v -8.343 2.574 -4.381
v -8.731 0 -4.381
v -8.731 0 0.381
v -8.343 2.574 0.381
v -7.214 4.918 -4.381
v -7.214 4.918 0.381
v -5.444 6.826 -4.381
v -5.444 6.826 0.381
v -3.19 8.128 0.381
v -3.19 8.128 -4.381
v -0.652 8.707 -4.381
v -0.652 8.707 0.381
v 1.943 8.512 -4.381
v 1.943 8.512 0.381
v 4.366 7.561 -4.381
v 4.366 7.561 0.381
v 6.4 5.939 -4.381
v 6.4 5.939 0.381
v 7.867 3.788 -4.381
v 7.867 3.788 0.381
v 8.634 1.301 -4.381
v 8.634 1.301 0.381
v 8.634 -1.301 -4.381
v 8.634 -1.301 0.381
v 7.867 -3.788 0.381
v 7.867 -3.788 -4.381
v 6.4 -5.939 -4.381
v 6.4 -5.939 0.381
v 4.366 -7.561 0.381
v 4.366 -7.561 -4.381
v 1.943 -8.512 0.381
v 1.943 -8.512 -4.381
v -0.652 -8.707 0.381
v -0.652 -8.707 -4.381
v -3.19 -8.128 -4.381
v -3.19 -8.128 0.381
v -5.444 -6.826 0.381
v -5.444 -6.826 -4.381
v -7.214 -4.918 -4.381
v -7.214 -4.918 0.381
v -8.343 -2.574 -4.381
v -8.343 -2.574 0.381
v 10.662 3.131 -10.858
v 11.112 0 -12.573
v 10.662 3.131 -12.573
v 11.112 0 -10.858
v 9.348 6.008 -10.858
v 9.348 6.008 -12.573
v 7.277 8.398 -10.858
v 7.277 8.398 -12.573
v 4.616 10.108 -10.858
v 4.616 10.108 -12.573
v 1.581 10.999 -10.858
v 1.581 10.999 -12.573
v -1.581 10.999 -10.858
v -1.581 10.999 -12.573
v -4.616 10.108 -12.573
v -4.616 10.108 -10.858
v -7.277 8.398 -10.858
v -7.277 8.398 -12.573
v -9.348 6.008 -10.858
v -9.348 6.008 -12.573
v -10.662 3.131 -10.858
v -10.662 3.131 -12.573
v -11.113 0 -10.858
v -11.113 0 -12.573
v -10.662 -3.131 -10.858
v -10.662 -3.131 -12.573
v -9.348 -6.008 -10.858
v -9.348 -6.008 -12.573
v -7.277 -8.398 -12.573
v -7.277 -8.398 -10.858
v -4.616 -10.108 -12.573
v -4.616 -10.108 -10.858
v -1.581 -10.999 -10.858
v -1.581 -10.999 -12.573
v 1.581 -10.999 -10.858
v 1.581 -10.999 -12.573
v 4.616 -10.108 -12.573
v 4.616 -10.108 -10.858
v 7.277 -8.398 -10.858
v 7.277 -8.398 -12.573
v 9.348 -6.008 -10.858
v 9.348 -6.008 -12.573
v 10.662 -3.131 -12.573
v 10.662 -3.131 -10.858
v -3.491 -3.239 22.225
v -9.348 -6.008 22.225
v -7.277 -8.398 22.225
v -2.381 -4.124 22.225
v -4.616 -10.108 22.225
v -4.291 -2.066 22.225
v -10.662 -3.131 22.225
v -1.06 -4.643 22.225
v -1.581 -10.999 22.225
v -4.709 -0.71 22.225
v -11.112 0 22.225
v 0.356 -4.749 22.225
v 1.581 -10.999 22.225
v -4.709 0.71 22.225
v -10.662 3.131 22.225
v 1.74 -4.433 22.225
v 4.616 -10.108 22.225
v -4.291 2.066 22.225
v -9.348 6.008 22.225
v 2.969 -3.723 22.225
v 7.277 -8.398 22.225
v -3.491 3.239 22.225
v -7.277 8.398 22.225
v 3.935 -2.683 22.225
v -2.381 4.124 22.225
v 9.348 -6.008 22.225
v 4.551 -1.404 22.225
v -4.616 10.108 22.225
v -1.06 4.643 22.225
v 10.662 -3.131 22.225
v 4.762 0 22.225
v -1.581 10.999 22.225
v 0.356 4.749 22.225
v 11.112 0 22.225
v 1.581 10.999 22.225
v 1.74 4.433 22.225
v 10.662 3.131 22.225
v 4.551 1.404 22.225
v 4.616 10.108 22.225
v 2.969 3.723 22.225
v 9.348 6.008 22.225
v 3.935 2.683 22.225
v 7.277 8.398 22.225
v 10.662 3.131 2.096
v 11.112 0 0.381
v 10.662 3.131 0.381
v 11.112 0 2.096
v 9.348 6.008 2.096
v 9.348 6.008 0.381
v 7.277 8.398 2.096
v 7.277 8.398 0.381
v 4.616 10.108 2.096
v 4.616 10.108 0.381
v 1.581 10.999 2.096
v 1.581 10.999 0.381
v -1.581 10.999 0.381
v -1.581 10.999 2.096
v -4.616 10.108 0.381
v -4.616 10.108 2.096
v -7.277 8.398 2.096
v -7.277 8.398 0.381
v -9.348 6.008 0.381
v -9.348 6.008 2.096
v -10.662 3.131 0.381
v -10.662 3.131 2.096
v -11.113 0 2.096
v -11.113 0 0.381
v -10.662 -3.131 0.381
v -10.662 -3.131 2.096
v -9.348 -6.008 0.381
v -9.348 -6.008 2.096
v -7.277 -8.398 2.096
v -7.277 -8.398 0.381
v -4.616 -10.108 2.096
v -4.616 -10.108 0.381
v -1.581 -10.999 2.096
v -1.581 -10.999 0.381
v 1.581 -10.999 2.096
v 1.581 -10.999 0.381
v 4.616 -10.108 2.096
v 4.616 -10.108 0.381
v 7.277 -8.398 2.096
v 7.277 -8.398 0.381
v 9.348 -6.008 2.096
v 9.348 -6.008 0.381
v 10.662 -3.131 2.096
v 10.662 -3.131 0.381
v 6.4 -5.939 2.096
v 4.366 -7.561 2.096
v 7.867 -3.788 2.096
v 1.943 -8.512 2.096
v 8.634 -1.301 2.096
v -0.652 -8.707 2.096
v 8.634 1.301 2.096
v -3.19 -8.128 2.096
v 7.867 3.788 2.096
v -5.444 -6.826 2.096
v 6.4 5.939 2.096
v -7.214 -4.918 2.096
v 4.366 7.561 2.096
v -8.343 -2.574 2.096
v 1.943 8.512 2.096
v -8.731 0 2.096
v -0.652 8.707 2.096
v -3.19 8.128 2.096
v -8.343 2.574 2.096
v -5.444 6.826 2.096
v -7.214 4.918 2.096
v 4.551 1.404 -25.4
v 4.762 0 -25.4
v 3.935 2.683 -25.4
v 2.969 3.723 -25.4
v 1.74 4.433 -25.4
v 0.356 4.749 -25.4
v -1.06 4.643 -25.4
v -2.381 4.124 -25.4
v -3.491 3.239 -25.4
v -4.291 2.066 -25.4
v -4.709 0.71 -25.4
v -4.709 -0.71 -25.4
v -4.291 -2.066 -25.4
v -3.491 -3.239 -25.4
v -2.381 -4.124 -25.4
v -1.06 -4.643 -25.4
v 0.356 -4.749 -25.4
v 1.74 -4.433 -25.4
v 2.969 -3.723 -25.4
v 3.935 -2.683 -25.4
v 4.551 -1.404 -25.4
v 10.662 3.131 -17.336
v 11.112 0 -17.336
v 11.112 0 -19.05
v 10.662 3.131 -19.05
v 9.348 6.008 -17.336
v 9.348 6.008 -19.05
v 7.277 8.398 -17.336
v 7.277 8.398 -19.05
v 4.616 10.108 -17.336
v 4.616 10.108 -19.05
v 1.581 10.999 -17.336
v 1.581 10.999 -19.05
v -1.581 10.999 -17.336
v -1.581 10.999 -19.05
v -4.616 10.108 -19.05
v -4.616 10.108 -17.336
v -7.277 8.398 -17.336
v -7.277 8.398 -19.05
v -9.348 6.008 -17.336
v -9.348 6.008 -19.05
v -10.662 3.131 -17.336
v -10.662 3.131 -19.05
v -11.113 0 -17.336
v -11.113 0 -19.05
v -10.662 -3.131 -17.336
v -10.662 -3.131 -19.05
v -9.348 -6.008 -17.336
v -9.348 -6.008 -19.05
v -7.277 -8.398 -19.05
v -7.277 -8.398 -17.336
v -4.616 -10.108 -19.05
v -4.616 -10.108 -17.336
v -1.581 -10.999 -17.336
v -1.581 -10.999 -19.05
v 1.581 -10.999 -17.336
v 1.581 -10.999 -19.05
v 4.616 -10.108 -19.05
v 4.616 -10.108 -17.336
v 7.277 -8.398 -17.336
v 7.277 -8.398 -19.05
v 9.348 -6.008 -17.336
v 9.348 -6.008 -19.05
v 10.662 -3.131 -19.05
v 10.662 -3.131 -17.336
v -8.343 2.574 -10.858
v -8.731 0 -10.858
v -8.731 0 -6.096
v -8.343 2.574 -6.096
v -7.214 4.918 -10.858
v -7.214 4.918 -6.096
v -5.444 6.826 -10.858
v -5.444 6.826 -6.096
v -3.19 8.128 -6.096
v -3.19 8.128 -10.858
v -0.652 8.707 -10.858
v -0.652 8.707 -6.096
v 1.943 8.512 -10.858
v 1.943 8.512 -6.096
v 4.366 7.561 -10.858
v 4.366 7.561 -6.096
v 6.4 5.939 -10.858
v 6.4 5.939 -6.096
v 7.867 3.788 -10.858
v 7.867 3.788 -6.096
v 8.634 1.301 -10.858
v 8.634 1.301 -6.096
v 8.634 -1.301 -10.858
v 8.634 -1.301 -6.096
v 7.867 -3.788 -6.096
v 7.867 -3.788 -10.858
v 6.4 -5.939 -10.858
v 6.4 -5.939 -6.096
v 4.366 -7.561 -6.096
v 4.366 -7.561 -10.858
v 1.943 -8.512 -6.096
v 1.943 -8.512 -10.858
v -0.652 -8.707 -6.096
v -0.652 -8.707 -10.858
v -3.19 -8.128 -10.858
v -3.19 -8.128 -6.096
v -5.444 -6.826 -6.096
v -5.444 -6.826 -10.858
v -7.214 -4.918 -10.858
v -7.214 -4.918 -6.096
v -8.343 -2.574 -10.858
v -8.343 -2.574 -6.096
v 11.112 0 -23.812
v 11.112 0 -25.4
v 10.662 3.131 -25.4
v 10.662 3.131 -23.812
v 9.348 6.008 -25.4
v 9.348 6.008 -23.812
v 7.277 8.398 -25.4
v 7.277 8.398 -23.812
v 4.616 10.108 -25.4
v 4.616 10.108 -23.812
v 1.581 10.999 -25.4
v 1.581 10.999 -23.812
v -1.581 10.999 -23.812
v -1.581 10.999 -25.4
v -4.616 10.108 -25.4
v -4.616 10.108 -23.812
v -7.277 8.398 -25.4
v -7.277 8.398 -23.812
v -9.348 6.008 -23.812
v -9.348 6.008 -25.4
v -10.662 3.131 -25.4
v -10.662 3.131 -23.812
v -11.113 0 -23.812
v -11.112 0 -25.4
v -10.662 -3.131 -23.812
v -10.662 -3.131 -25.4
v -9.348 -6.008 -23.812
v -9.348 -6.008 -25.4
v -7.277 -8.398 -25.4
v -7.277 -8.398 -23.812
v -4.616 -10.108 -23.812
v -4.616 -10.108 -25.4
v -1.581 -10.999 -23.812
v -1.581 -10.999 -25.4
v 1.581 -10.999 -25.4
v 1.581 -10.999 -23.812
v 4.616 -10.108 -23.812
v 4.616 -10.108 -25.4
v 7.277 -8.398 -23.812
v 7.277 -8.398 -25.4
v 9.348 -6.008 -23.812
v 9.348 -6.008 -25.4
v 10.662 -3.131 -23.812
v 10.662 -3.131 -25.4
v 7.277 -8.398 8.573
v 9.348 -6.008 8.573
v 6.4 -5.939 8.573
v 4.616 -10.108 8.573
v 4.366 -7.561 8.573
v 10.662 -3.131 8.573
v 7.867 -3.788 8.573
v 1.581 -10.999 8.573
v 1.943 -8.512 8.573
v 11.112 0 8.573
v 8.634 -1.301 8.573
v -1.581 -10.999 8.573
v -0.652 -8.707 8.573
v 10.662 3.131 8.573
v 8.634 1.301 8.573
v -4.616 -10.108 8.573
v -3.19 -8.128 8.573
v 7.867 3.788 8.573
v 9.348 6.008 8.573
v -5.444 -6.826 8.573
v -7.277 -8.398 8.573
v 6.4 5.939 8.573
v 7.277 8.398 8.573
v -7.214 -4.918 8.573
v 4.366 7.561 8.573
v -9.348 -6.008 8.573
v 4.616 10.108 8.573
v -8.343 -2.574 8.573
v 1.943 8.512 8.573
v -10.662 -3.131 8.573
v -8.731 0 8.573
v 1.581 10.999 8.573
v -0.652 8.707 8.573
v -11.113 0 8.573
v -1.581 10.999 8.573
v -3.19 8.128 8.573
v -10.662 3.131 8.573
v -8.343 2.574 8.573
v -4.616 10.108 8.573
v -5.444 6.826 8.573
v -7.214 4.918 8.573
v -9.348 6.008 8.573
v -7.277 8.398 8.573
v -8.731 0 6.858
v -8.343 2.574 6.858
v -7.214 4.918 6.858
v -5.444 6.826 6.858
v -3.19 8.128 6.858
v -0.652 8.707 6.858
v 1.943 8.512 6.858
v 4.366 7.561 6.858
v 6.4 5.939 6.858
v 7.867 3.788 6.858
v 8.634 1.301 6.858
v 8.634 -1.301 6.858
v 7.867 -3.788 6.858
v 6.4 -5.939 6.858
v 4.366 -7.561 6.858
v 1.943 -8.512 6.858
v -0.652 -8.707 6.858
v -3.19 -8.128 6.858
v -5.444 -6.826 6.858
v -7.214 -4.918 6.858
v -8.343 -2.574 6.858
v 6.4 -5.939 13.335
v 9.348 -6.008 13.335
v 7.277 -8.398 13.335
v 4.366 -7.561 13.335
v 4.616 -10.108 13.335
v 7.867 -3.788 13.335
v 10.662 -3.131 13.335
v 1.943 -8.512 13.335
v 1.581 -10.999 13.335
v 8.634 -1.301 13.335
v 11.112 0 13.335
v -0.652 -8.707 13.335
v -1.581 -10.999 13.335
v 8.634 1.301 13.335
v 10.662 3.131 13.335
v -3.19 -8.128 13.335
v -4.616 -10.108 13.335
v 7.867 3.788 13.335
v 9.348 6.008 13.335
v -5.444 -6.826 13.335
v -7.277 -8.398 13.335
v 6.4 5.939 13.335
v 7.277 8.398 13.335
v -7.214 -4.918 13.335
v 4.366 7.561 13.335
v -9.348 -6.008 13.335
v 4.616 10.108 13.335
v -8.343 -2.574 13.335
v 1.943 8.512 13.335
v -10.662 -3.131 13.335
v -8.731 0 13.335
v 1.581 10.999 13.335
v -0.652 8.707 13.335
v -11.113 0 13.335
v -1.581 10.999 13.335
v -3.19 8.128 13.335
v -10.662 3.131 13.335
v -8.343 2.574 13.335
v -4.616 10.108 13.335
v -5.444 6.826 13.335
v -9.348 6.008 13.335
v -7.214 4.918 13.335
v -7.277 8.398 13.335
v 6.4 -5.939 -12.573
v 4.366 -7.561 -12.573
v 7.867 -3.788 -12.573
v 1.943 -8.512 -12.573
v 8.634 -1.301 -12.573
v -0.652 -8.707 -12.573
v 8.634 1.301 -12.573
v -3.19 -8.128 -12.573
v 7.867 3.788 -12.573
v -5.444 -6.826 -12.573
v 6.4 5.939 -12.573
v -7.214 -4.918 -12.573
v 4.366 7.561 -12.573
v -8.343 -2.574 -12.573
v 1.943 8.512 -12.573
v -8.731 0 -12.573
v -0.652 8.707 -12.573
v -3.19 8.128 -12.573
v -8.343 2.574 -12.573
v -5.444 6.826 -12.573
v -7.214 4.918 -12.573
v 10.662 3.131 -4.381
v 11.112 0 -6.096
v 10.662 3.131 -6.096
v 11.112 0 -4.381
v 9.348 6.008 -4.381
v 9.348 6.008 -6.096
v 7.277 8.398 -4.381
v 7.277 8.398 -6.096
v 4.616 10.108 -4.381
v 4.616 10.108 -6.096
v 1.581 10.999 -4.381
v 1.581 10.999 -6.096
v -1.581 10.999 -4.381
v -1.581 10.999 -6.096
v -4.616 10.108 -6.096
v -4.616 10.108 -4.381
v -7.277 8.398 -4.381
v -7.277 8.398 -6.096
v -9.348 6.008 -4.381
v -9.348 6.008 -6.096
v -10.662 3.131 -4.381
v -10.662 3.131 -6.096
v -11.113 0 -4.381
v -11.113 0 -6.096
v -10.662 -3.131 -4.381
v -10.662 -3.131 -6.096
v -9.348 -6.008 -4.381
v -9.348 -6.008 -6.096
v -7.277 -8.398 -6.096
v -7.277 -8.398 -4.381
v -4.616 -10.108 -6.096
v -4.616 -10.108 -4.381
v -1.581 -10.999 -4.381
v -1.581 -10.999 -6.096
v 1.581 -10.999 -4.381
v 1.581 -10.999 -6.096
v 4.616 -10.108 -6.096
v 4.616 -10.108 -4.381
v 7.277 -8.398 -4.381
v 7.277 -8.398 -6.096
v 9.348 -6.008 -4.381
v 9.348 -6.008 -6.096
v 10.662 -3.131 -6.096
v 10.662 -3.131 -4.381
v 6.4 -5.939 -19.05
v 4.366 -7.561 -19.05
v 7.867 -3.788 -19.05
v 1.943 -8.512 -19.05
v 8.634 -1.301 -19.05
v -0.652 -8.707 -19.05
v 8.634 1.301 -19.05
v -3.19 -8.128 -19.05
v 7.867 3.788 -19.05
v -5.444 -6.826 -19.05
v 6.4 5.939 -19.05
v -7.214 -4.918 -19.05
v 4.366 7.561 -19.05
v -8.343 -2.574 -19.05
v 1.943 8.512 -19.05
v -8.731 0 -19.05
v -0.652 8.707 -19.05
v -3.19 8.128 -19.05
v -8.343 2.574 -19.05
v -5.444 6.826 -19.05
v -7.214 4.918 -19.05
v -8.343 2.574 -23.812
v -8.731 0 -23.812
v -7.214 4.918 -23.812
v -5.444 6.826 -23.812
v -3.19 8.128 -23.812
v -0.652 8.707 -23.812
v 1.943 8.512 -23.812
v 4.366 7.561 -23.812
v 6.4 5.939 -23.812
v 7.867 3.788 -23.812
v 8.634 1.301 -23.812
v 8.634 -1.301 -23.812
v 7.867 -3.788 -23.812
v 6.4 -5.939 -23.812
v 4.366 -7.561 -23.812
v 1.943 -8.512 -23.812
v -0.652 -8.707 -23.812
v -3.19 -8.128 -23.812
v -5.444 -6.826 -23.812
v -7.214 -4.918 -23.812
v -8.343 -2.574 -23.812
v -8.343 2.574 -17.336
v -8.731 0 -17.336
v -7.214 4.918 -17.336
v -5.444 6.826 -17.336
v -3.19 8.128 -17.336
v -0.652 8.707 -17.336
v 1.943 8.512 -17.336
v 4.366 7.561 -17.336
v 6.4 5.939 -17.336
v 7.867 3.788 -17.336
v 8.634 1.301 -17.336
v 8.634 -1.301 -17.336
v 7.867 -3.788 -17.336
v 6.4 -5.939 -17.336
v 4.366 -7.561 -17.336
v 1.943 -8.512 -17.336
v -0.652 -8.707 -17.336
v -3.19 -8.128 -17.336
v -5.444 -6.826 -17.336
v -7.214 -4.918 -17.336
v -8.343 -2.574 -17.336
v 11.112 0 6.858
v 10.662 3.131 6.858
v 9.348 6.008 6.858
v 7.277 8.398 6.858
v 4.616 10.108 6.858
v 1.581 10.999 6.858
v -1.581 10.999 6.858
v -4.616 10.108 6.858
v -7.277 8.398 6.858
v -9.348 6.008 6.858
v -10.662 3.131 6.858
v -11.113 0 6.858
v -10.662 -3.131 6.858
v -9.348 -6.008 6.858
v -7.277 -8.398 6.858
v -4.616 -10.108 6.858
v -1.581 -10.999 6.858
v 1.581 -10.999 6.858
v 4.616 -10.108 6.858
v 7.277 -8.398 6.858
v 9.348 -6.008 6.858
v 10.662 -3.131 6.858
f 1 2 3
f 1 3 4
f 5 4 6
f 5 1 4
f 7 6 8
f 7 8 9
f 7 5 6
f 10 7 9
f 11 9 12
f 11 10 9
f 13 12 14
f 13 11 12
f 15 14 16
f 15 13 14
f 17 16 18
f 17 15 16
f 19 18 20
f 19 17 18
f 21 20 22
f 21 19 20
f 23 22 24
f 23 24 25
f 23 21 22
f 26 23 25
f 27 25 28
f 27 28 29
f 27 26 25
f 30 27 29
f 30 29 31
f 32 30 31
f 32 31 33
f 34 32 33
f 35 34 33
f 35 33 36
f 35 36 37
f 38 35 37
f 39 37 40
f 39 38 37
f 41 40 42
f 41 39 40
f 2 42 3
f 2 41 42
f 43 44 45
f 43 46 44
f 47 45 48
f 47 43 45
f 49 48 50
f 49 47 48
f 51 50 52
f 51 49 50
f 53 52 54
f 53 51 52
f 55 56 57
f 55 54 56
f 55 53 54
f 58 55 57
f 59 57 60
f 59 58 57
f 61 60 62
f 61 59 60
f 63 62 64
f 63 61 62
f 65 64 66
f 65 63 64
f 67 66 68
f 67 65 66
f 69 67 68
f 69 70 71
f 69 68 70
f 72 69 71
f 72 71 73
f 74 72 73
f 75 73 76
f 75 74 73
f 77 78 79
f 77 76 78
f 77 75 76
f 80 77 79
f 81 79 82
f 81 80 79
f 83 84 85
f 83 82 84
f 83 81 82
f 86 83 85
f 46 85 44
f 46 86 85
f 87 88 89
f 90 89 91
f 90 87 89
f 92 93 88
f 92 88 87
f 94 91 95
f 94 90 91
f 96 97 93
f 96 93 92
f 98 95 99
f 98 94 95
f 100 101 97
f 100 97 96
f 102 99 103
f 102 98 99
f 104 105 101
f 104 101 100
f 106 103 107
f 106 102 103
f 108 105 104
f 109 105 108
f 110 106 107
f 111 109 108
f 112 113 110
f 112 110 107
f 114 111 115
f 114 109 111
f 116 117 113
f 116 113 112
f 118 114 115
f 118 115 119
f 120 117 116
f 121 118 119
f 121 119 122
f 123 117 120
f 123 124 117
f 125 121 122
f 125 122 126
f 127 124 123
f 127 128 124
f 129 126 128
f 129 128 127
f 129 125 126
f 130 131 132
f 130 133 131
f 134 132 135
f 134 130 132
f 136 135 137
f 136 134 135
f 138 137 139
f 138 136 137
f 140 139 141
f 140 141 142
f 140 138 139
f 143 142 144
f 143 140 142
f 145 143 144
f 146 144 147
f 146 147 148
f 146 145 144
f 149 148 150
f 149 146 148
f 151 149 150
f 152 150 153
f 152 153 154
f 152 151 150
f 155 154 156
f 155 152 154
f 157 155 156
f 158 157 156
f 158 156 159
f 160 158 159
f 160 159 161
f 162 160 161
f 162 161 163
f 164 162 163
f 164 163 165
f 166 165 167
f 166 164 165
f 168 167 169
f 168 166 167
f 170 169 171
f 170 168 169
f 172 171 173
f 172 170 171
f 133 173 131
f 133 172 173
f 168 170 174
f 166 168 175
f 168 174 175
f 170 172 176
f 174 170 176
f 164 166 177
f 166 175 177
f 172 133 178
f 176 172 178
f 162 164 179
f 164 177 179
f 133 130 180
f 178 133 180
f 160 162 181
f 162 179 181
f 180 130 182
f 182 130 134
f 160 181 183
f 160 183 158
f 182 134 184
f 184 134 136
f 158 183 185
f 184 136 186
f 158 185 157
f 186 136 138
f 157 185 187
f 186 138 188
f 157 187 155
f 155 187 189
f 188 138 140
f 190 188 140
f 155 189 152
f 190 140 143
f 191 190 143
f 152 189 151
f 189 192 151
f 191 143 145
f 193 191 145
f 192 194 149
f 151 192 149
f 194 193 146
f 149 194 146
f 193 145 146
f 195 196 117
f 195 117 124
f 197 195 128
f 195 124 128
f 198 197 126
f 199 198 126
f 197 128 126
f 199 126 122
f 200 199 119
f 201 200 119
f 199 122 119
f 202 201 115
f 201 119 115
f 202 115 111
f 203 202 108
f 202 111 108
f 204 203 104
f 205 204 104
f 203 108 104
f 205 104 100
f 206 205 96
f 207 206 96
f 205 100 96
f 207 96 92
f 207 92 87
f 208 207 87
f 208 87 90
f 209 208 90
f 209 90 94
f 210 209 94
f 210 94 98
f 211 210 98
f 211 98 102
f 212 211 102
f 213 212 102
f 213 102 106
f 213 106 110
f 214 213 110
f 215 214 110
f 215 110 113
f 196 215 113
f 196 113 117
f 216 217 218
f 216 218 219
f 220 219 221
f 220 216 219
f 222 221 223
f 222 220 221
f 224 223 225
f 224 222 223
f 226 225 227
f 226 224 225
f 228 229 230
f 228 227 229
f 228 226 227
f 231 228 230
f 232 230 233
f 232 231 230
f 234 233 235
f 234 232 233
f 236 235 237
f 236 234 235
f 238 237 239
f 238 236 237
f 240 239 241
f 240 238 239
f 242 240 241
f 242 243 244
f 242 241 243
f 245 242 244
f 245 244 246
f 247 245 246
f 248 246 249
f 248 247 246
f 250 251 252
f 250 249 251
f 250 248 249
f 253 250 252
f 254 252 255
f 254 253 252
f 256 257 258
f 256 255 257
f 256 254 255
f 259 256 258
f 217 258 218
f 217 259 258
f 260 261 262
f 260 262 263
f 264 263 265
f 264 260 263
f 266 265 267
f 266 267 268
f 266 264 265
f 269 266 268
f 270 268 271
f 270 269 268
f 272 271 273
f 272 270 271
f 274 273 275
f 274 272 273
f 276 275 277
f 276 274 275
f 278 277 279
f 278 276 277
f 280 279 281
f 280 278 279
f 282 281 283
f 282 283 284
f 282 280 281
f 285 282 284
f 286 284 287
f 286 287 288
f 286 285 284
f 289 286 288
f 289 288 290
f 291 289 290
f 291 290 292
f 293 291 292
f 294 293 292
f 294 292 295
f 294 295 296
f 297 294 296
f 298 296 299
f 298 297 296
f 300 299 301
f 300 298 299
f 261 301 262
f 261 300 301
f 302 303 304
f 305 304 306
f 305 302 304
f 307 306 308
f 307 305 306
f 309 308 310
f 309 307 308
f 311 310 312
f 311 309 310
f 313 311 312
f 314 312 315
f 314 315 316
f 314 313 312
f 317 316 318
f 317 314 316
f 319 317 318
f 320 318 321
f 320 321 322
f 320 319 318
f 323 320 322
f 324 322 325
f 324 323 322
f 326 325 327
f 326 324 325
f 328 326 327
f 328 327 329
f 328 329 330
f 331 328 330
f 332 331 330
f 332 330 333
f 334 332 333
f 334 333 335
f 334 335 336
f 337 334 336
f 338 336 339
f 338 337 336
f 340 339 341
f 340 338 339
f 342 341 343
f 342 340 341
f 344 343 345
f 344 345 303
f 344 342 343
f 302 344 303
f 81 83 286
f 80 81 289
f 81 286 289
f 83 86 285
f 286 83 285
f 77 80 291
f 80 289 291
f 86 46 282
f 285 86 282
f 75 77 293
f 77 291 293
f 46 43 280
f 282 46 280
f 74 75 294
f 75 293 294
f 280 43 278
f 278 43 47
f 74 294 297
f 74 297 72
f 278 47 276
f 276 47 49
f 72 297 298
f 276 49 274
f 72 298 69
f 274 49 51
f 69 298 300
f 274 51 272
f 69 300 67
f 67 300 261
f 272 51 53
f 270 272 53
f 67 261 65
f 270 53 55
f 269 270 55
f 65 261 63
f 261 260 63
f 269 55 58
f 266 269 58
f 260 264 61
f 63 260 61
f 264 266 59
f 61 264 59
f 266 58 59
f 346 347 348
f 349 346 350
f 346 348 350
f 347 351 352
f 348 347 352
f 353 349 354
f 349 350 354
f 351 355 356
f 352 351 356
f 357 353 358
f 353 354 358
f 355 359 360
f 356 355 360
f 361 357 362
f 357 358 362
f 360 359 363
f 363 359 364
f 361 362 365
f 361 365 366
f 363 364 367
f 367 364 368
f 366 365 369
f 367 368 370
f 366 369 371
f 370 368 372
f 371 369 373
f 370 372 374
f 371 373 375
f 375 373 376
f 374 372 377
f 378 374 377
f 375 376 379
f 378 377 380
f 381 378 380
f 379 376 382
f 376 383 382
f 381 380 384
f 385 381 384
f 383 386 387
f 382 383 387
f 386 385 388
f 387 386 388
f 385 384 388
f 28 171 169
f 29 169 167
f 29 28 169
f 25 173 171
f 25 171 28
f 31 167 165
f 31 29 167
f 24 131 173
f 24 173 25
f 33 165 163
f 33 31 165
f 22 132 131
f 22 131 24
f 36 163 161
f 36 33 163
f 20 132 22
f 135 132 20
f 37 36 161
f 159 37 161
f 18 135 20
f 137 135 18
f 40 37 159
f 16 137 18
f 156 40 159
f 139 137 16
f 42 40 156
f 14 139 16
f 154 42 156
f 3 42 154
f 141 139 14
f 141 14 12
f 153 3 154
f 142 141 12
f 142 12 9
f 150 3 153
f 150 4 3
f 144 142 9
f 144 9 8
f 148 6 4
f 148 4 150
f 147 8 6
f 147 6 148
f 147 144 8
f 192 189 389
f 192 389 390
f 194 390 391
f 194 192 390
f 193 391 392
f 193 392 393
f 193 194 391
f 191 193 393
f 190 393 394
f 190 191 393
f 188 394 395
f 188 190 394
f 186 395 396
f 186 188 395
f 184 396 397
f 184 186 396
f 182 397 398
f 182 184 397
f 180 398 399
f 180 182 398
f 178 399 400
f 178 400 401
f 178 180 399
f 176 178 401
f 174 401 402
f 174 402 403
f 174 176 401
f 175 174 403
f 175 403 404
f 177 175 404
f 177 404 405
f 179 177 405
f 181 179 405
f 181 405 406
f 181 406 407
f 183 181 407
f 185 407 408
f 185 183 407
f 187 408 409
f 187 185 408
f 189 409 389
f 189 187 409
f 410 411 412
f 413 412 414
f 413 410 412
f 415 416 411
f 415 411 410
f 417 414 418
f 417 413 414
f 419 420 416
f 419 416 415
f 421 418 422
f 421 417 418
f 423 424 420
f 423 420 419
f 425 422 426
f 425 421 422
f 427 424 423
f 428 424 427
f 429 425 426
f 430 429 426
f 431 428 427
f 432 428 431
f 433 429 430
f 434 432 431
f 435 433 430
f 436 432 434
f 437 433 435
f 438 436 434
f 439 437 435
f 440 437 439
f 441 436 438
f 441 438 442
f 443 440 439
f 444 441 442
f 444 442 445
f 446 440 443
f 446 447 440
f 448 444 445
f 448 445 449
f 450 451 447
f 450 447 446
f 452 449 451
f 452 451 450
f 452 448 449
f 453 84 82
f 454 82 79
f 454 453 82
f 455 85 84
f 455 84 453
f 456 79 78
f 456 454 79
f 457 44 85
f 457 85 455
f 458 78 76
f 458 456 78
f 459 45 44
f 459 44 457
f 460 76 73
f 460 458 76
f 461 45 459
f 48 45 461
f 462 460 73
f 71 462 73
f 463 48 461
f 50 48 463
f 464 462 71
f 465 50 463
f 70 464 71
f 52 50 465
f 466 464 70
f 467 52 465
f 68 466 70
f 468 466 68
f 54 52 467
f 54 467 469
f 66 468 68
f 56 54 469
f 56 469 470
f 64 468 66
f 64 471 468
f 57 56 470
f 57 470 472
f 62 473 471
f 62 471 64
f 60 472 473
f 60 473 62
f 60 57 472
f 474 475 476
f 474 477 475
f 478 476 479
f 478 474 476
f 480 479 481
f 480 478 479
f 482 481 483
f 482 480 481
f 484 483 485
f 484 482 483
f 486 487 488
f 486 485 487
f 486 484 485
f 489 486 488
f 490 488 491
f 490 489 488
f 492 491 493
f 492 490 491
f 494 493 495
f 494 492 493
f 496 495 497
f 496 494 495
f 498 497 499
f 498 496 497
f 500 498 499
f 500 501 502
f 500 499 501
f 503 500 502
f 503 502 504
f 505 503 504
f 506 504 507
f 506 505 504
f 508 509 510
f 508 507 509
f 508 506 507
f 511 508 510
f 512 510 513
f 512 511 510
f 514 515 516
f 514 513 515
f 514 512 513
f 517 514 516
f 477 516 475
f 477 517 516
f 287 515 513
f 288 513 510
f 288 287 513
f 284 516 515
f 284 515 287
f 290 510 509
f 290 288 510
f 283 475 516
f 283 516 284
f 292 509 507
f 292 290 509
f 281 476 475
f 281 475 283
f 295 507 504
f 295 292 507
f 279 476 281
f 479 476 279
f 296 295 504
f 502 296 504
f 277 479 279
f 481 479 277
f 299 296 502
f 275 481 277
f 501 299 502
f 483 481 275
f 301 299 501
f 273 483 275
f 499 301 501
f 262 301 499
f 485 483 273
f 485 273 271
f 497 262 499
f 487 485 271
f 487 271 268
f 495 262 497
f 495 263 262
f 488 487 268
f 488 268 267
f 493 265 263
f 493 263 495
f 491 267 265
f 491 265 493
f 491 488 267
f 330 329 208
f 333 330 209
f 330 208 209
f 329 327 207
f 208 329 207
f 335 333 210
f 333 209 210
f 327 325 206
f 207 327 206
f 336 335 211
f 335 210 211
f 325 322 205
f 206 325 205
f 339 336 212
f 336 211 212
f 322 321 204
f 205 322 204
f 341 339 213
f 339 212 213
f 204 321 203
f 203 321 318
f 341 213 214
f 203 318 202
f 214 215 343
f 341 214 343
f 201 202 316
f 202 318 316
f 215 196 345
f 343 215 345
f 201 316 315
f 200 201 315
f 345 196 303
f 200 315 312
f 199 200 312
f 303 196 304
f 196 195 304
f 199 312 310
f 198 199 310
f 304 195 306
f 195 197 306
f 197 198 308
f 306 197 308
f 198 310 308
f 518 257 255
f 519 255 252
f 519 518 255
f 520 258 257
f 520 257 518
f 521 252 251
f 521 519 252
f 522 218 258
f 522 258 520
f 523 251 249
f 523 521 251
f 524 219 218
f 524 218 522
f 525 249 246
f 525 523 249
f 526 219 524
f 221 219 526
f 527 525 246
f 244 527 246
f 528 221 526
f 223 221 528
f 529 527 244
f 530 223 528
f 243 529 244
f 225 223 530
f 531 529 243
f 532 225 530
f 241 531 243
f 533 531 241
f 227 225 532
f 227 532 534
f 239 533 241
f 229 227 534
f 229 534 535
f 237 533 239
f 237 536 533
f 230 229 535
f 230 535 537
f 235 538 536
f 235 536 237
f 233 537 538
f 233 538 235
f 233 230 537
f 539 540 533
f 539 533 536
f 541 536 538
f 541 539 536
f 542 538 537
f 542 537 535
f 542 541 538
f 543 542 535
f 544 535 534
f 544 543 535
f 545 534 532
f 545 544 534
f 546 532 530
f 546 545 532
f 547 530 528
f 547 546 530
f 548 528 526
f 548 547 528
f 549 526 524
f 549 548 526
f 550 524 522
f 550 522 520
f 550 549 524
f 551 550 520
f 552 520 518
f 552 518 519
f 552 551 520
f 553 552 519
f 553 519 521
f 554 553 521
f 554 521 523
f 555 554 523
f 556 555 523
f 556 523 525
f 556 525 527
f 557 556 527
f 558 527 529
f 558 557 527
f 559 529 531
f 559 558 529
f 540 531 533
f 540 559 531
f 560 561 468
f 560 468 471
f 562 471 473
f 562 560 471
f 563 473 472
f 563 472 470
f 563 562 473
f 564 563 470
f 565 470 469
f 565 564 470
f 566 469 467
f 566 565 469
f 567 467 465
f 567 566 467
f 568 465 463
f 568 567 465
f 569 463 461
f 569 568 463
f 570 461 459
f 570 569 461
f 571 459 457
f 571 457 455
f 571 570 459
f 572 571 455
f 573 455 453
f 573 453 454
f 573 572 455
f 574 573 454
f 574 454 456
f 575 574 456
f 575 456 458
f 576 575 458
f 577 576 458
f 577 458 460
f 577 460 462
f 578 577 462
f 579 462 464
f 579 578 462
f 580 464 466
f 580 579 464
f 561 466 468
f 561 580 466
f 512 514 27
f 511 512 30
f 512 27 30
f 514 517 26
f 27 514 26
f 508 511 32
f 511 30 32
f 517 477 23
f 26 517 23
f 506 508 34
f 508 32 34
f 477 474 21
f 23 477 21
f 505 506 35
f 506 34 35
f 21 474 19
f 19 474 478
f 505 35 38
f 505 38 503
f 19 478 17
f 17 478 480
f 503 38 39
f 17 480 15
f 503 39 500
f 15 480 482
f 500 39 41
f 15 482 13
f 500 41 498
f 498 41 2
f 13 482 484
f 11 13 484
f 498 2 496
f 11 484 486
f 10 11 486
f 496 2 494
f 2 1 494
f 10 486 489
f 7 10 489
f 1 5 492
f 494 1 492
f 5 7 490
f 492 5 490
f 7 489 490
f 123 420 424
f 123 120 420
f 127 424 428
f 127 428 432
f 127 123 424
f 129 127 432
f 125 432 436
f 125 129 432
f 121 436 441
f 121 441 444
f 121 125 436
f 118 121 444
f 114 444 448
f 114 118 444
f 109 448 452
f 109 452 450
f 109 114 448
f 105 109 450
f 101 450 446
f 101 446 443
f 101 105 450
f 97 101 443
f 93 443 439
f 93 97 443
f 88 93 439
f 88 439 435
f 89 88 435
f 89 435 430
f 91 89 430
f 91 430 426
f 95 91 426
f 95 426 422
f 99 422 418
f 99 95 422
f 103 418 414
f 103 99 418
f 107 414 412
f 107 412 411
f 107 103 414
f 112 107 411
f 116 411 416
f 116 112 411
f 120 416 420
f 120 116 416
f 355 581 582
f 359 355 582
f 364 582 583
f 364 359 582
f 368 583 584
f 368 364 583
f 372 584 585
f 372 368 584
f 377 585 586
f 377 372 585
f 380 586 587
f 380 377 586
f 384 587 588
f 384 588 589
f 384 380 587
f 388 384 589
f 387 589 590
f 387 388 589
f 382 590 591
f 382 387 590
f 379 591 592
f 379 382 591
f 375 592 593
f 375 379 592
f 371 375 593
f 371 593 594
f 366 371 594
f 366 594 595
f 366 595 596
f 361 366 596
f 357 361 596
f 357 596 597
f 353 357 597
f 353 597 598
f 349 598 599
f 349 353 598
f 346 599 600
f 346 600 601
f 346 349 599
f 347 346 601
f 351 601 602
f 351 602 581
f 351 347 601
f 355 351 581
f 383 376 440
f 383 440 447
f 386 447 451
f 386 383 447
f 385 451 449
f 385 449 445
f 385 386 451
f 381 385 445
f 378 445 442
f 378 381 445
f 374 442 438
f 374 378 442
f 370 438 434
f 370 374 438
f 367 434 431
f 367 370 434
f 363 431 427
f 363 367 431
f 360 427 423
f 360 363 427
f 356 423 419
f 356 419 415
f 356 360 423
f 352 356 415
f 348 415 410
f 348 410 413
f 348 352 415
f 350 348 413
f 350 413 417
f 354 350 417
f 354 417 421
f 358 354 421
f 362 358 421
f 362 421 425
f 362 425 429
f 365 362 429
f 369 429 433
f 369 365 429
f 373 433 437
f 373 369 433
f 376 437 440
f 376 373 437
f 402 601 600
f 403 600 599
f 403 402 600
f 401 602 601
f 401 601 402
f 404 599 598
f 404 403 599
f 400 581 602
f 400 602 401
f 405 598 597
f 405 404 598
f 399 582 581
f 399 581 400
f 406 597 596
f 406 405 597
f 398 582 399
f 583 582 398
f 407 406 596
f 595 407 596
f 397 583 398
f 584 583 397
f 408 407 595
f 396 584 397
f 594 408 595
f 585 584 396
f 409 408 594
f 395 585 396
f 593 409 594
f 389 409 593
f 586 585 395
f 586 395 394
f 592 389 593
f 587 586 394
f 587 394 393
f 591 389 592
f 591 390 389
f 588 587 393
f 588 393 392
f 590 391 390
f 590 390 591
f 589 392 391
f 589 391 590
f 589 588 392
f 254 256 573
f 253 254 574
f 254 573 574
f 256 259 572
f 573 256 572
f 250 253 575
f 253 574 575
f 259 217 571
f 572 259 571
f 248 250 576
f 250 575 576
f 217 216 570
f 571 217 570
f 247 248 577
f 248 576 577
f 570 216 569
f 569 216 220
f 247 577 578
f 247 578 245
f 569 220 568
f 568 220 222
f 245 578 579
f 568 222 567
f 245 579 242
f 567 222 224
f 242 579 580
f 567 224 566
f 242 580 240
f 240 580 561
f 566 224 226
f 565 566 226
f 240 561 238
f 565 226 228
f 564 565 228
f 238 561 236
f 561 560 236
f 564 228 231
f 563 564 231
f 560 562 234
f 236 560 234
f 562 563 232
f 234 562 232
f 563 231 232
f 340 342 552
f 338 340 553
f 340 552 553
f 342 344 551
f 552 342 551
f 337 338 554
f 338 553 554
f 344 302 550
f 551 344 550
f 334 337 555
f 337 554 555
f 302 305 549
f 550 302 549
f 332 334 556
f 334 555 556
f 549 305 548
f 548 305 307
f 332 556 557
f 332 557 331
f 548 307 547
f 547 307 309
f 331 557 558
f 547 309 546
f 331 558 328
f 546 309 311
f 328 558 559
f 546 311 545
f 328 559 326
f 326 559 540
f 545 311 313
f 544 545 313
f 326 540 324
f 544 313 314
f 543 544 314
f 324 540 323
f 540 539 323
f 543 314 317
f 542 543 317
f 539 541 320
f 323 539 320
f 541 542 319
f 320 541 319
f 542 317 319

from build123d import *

# Parameters (mm, degrees)
SKETCH1_R          = 11.1125
SKETCH1_R_2        = 3.2004
EXTRUDE1_DEPTH     = 25.4
SKETCH5_R          = 11.1125
SKETCH5_R_2        = 3.2004
CUT_EXTRUDE1_DEPTH = 3.175
SKETCH6_R          = 4.7625
CUT_EXTRUDE2_DEPTH = 48.625
CUT_EXTRUDE3_START = -1.5875
SKETCH7_R          = 11.1125
SKETCH7_R_2        = 8.73125
CUT_EXTRUDE3_DEPTH = 4.7625
LPATTERN1_COUNT    = 6
LPATTERN1_PITCH    = 6.477


with BuildPart() as part:
    # Sketch1 → Extrude1 (new body, symmetric)
    with BuildSketch(Plane.XY):
        Circle(SKETCH1_R)
        Circle(SKETCH1_R_2, mode=Mode.SUBTRACT)
    extrude(amount=EXTRUDE1_DEPTH, both=True)

    # Sketch5 → Cut-Extrude1 (cut)
    with BuildSketch(Plane.XY.offset(25.4)):
        Circle(SKETCH5_R)
        Circle(SKETCH5_R_2, mode=Mode.SUBTRACT)
    extrude(amount=-CUT_EXTRUDE1_DEPTH, mode=Mode.SUBTRACT)

    # Sketch6 → Cut-Extrude2 (cut, through all)
    with BuildSketch(Plane.XY.offset(22.225)):
        Circle(SKETCH6_R)
    extrude(amount=-CUT_EXTRUDE2_DEPTH, mode=Mode.SUBTRACT)

    # Sketch7 → Cut-Extrude3 (cut)
    with BuildSketch(Plane(origin=(0, 0, -25.4), x_dir=(-1, 0, 0), z_dir=(0, 0, -1)).offset(CUT_EXTRUDE3_START)):
        Circle(SKETCH7_R)
        Circle(SKETCH7_R_2, mode=Mode.SUBTRACT)
    cut_extrude3 = extrude(amount=-CUT_EXTRUDE3_DEPTH, mode=Mode.SUBTRACT)

    # LPattern1: Cut-Extrude3 ×6
    with Locations(*[(0, 0, i * LPATTERN1_PITCH) for i in range(1, LPATTERN1_COUNT)]):
        add(cut_extrude3, mode=Mode.SUBTRACT)


solid = part.part
